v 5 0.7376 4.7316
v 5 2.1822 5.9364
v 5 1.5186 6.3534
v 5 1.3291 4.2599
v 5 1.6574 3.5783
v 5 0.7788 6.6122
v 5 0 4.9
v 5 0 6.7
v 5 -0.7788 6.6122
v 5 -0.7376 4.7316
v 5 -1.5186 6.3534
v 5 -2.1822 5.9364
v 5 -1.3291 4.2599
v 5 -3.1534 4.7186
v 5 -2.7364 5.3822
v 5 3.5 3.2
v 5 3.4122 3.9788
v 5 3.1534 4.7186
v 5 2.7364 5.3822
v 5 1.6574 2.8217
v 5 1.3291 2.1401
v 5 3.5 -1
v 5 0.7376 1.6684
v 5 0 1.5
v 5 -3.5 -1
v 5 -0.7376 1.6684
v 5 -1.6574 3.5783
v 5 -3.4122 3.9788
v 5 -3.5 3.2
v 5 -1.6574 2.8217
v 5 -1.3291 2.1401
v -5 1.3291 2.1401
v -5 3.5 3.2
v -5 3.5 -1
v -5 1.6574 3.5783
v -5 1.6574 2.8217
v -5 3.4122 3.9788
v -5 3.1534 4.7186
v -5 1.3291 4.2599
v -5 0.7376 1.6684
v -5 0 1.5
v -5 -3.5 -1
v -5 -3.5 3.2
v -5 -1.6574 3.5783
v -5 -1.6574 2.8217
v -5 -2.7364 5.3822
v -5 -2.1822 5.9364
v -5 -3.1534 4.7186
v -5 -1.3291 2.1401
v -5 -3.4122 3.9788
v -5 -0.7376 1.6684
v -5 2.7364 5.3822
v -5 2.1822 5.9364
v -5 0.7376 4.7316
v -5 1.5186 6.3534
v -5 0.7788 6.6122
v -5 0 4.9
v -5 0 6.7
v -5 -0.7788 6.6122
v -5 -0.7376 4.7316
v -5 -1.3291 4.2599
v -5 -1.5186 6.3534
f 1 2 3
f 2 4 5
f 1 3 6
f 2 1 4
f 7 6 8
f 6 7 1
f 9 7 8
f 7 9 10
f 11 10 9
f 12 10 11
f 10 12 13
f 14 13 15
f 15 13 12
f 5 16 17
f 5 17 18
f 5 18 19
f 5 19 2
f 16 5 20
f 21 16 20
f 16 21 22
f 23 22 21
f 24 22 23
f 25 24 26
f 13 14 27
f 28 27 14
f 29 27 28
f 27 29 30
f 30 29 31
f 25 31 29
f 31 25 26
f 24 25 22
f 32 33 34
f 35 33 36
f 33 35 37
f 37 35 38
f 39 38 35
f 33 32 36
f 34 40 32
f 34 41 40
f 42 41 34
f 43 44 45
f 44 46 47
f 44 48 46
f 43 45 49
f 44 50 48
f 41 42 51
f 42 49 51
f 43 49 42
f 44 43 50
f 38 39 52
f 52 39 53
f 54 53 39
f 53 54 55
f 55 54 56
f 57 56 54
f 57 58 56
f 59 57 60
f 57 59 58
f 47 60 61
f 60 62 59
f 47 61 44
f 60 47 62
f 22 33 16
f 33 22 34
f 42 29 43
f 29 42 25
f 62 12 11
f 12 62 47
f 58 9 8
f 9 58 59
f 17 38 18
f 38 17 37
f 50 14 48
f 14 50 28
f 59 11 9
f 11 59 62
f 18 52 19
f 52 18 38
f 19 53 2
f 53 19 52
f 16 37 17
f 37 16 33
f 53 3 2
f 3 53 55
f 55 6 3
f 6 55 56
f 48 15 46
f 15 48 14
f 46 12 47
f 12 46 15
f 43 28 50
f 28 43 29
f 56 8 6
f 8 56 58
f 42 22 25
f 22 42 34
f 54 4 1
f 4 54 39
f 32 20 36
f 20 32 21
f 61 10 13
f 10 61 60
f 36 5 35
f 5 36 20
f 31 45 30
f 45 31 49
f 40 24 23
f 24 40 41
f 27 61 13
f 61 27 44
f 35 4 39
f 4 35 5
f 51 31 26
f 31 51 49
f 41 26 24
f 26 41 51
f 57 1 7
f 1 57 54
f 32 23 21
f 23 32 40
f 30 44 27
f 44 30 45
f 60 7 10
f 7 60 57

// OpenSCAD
$fs = 0.8; 
$fa = 10;

screwRadius = 3.4 /2;
wallThickness = 1.5;

connectorWidth 	= 7;
connectorLength 	= 10;
connectorThickness = 1;

portPlay 		= 0.3;
portThickness 	= 10;

module negatives() color("red") {
	translate([-100, 0, screwRadius + wallThickness]) rotate([0, 90, 0]) cylinder(r = screwRadius, h = 200);
}

module basePlate() {
	translate([-connectorLength/2, -connectorWidth/2, -connectorThickness]) 
		cube([connectorLength, connectorWidth, connectorThickness + 0.001]);
}

module connectorPin() {
	translate([0, -connectorWidth/2, 0]) {
		cube([portThickness, connectorWidth, wallThickness + screwRadius]);
		
		translate([0, connectorWidth/2, wallThickness + screwRadius]) 
			rotate([0, 90, 0]) 
			cylinder(r = connectorWidth/2, h = portThickness);
	}
}

module connectorArray(l = connectorLength) translate([-l/2, 0, 0]) {
	for(i = [0:2*(portThickness + portPlay):l - portThickness]) translate([i, 0, 0]) connectorPin();
}

module base() {
	basePlate();
	connectorArray();
}

module conA() difference() {
	base();
	negatives();
}

conA();
